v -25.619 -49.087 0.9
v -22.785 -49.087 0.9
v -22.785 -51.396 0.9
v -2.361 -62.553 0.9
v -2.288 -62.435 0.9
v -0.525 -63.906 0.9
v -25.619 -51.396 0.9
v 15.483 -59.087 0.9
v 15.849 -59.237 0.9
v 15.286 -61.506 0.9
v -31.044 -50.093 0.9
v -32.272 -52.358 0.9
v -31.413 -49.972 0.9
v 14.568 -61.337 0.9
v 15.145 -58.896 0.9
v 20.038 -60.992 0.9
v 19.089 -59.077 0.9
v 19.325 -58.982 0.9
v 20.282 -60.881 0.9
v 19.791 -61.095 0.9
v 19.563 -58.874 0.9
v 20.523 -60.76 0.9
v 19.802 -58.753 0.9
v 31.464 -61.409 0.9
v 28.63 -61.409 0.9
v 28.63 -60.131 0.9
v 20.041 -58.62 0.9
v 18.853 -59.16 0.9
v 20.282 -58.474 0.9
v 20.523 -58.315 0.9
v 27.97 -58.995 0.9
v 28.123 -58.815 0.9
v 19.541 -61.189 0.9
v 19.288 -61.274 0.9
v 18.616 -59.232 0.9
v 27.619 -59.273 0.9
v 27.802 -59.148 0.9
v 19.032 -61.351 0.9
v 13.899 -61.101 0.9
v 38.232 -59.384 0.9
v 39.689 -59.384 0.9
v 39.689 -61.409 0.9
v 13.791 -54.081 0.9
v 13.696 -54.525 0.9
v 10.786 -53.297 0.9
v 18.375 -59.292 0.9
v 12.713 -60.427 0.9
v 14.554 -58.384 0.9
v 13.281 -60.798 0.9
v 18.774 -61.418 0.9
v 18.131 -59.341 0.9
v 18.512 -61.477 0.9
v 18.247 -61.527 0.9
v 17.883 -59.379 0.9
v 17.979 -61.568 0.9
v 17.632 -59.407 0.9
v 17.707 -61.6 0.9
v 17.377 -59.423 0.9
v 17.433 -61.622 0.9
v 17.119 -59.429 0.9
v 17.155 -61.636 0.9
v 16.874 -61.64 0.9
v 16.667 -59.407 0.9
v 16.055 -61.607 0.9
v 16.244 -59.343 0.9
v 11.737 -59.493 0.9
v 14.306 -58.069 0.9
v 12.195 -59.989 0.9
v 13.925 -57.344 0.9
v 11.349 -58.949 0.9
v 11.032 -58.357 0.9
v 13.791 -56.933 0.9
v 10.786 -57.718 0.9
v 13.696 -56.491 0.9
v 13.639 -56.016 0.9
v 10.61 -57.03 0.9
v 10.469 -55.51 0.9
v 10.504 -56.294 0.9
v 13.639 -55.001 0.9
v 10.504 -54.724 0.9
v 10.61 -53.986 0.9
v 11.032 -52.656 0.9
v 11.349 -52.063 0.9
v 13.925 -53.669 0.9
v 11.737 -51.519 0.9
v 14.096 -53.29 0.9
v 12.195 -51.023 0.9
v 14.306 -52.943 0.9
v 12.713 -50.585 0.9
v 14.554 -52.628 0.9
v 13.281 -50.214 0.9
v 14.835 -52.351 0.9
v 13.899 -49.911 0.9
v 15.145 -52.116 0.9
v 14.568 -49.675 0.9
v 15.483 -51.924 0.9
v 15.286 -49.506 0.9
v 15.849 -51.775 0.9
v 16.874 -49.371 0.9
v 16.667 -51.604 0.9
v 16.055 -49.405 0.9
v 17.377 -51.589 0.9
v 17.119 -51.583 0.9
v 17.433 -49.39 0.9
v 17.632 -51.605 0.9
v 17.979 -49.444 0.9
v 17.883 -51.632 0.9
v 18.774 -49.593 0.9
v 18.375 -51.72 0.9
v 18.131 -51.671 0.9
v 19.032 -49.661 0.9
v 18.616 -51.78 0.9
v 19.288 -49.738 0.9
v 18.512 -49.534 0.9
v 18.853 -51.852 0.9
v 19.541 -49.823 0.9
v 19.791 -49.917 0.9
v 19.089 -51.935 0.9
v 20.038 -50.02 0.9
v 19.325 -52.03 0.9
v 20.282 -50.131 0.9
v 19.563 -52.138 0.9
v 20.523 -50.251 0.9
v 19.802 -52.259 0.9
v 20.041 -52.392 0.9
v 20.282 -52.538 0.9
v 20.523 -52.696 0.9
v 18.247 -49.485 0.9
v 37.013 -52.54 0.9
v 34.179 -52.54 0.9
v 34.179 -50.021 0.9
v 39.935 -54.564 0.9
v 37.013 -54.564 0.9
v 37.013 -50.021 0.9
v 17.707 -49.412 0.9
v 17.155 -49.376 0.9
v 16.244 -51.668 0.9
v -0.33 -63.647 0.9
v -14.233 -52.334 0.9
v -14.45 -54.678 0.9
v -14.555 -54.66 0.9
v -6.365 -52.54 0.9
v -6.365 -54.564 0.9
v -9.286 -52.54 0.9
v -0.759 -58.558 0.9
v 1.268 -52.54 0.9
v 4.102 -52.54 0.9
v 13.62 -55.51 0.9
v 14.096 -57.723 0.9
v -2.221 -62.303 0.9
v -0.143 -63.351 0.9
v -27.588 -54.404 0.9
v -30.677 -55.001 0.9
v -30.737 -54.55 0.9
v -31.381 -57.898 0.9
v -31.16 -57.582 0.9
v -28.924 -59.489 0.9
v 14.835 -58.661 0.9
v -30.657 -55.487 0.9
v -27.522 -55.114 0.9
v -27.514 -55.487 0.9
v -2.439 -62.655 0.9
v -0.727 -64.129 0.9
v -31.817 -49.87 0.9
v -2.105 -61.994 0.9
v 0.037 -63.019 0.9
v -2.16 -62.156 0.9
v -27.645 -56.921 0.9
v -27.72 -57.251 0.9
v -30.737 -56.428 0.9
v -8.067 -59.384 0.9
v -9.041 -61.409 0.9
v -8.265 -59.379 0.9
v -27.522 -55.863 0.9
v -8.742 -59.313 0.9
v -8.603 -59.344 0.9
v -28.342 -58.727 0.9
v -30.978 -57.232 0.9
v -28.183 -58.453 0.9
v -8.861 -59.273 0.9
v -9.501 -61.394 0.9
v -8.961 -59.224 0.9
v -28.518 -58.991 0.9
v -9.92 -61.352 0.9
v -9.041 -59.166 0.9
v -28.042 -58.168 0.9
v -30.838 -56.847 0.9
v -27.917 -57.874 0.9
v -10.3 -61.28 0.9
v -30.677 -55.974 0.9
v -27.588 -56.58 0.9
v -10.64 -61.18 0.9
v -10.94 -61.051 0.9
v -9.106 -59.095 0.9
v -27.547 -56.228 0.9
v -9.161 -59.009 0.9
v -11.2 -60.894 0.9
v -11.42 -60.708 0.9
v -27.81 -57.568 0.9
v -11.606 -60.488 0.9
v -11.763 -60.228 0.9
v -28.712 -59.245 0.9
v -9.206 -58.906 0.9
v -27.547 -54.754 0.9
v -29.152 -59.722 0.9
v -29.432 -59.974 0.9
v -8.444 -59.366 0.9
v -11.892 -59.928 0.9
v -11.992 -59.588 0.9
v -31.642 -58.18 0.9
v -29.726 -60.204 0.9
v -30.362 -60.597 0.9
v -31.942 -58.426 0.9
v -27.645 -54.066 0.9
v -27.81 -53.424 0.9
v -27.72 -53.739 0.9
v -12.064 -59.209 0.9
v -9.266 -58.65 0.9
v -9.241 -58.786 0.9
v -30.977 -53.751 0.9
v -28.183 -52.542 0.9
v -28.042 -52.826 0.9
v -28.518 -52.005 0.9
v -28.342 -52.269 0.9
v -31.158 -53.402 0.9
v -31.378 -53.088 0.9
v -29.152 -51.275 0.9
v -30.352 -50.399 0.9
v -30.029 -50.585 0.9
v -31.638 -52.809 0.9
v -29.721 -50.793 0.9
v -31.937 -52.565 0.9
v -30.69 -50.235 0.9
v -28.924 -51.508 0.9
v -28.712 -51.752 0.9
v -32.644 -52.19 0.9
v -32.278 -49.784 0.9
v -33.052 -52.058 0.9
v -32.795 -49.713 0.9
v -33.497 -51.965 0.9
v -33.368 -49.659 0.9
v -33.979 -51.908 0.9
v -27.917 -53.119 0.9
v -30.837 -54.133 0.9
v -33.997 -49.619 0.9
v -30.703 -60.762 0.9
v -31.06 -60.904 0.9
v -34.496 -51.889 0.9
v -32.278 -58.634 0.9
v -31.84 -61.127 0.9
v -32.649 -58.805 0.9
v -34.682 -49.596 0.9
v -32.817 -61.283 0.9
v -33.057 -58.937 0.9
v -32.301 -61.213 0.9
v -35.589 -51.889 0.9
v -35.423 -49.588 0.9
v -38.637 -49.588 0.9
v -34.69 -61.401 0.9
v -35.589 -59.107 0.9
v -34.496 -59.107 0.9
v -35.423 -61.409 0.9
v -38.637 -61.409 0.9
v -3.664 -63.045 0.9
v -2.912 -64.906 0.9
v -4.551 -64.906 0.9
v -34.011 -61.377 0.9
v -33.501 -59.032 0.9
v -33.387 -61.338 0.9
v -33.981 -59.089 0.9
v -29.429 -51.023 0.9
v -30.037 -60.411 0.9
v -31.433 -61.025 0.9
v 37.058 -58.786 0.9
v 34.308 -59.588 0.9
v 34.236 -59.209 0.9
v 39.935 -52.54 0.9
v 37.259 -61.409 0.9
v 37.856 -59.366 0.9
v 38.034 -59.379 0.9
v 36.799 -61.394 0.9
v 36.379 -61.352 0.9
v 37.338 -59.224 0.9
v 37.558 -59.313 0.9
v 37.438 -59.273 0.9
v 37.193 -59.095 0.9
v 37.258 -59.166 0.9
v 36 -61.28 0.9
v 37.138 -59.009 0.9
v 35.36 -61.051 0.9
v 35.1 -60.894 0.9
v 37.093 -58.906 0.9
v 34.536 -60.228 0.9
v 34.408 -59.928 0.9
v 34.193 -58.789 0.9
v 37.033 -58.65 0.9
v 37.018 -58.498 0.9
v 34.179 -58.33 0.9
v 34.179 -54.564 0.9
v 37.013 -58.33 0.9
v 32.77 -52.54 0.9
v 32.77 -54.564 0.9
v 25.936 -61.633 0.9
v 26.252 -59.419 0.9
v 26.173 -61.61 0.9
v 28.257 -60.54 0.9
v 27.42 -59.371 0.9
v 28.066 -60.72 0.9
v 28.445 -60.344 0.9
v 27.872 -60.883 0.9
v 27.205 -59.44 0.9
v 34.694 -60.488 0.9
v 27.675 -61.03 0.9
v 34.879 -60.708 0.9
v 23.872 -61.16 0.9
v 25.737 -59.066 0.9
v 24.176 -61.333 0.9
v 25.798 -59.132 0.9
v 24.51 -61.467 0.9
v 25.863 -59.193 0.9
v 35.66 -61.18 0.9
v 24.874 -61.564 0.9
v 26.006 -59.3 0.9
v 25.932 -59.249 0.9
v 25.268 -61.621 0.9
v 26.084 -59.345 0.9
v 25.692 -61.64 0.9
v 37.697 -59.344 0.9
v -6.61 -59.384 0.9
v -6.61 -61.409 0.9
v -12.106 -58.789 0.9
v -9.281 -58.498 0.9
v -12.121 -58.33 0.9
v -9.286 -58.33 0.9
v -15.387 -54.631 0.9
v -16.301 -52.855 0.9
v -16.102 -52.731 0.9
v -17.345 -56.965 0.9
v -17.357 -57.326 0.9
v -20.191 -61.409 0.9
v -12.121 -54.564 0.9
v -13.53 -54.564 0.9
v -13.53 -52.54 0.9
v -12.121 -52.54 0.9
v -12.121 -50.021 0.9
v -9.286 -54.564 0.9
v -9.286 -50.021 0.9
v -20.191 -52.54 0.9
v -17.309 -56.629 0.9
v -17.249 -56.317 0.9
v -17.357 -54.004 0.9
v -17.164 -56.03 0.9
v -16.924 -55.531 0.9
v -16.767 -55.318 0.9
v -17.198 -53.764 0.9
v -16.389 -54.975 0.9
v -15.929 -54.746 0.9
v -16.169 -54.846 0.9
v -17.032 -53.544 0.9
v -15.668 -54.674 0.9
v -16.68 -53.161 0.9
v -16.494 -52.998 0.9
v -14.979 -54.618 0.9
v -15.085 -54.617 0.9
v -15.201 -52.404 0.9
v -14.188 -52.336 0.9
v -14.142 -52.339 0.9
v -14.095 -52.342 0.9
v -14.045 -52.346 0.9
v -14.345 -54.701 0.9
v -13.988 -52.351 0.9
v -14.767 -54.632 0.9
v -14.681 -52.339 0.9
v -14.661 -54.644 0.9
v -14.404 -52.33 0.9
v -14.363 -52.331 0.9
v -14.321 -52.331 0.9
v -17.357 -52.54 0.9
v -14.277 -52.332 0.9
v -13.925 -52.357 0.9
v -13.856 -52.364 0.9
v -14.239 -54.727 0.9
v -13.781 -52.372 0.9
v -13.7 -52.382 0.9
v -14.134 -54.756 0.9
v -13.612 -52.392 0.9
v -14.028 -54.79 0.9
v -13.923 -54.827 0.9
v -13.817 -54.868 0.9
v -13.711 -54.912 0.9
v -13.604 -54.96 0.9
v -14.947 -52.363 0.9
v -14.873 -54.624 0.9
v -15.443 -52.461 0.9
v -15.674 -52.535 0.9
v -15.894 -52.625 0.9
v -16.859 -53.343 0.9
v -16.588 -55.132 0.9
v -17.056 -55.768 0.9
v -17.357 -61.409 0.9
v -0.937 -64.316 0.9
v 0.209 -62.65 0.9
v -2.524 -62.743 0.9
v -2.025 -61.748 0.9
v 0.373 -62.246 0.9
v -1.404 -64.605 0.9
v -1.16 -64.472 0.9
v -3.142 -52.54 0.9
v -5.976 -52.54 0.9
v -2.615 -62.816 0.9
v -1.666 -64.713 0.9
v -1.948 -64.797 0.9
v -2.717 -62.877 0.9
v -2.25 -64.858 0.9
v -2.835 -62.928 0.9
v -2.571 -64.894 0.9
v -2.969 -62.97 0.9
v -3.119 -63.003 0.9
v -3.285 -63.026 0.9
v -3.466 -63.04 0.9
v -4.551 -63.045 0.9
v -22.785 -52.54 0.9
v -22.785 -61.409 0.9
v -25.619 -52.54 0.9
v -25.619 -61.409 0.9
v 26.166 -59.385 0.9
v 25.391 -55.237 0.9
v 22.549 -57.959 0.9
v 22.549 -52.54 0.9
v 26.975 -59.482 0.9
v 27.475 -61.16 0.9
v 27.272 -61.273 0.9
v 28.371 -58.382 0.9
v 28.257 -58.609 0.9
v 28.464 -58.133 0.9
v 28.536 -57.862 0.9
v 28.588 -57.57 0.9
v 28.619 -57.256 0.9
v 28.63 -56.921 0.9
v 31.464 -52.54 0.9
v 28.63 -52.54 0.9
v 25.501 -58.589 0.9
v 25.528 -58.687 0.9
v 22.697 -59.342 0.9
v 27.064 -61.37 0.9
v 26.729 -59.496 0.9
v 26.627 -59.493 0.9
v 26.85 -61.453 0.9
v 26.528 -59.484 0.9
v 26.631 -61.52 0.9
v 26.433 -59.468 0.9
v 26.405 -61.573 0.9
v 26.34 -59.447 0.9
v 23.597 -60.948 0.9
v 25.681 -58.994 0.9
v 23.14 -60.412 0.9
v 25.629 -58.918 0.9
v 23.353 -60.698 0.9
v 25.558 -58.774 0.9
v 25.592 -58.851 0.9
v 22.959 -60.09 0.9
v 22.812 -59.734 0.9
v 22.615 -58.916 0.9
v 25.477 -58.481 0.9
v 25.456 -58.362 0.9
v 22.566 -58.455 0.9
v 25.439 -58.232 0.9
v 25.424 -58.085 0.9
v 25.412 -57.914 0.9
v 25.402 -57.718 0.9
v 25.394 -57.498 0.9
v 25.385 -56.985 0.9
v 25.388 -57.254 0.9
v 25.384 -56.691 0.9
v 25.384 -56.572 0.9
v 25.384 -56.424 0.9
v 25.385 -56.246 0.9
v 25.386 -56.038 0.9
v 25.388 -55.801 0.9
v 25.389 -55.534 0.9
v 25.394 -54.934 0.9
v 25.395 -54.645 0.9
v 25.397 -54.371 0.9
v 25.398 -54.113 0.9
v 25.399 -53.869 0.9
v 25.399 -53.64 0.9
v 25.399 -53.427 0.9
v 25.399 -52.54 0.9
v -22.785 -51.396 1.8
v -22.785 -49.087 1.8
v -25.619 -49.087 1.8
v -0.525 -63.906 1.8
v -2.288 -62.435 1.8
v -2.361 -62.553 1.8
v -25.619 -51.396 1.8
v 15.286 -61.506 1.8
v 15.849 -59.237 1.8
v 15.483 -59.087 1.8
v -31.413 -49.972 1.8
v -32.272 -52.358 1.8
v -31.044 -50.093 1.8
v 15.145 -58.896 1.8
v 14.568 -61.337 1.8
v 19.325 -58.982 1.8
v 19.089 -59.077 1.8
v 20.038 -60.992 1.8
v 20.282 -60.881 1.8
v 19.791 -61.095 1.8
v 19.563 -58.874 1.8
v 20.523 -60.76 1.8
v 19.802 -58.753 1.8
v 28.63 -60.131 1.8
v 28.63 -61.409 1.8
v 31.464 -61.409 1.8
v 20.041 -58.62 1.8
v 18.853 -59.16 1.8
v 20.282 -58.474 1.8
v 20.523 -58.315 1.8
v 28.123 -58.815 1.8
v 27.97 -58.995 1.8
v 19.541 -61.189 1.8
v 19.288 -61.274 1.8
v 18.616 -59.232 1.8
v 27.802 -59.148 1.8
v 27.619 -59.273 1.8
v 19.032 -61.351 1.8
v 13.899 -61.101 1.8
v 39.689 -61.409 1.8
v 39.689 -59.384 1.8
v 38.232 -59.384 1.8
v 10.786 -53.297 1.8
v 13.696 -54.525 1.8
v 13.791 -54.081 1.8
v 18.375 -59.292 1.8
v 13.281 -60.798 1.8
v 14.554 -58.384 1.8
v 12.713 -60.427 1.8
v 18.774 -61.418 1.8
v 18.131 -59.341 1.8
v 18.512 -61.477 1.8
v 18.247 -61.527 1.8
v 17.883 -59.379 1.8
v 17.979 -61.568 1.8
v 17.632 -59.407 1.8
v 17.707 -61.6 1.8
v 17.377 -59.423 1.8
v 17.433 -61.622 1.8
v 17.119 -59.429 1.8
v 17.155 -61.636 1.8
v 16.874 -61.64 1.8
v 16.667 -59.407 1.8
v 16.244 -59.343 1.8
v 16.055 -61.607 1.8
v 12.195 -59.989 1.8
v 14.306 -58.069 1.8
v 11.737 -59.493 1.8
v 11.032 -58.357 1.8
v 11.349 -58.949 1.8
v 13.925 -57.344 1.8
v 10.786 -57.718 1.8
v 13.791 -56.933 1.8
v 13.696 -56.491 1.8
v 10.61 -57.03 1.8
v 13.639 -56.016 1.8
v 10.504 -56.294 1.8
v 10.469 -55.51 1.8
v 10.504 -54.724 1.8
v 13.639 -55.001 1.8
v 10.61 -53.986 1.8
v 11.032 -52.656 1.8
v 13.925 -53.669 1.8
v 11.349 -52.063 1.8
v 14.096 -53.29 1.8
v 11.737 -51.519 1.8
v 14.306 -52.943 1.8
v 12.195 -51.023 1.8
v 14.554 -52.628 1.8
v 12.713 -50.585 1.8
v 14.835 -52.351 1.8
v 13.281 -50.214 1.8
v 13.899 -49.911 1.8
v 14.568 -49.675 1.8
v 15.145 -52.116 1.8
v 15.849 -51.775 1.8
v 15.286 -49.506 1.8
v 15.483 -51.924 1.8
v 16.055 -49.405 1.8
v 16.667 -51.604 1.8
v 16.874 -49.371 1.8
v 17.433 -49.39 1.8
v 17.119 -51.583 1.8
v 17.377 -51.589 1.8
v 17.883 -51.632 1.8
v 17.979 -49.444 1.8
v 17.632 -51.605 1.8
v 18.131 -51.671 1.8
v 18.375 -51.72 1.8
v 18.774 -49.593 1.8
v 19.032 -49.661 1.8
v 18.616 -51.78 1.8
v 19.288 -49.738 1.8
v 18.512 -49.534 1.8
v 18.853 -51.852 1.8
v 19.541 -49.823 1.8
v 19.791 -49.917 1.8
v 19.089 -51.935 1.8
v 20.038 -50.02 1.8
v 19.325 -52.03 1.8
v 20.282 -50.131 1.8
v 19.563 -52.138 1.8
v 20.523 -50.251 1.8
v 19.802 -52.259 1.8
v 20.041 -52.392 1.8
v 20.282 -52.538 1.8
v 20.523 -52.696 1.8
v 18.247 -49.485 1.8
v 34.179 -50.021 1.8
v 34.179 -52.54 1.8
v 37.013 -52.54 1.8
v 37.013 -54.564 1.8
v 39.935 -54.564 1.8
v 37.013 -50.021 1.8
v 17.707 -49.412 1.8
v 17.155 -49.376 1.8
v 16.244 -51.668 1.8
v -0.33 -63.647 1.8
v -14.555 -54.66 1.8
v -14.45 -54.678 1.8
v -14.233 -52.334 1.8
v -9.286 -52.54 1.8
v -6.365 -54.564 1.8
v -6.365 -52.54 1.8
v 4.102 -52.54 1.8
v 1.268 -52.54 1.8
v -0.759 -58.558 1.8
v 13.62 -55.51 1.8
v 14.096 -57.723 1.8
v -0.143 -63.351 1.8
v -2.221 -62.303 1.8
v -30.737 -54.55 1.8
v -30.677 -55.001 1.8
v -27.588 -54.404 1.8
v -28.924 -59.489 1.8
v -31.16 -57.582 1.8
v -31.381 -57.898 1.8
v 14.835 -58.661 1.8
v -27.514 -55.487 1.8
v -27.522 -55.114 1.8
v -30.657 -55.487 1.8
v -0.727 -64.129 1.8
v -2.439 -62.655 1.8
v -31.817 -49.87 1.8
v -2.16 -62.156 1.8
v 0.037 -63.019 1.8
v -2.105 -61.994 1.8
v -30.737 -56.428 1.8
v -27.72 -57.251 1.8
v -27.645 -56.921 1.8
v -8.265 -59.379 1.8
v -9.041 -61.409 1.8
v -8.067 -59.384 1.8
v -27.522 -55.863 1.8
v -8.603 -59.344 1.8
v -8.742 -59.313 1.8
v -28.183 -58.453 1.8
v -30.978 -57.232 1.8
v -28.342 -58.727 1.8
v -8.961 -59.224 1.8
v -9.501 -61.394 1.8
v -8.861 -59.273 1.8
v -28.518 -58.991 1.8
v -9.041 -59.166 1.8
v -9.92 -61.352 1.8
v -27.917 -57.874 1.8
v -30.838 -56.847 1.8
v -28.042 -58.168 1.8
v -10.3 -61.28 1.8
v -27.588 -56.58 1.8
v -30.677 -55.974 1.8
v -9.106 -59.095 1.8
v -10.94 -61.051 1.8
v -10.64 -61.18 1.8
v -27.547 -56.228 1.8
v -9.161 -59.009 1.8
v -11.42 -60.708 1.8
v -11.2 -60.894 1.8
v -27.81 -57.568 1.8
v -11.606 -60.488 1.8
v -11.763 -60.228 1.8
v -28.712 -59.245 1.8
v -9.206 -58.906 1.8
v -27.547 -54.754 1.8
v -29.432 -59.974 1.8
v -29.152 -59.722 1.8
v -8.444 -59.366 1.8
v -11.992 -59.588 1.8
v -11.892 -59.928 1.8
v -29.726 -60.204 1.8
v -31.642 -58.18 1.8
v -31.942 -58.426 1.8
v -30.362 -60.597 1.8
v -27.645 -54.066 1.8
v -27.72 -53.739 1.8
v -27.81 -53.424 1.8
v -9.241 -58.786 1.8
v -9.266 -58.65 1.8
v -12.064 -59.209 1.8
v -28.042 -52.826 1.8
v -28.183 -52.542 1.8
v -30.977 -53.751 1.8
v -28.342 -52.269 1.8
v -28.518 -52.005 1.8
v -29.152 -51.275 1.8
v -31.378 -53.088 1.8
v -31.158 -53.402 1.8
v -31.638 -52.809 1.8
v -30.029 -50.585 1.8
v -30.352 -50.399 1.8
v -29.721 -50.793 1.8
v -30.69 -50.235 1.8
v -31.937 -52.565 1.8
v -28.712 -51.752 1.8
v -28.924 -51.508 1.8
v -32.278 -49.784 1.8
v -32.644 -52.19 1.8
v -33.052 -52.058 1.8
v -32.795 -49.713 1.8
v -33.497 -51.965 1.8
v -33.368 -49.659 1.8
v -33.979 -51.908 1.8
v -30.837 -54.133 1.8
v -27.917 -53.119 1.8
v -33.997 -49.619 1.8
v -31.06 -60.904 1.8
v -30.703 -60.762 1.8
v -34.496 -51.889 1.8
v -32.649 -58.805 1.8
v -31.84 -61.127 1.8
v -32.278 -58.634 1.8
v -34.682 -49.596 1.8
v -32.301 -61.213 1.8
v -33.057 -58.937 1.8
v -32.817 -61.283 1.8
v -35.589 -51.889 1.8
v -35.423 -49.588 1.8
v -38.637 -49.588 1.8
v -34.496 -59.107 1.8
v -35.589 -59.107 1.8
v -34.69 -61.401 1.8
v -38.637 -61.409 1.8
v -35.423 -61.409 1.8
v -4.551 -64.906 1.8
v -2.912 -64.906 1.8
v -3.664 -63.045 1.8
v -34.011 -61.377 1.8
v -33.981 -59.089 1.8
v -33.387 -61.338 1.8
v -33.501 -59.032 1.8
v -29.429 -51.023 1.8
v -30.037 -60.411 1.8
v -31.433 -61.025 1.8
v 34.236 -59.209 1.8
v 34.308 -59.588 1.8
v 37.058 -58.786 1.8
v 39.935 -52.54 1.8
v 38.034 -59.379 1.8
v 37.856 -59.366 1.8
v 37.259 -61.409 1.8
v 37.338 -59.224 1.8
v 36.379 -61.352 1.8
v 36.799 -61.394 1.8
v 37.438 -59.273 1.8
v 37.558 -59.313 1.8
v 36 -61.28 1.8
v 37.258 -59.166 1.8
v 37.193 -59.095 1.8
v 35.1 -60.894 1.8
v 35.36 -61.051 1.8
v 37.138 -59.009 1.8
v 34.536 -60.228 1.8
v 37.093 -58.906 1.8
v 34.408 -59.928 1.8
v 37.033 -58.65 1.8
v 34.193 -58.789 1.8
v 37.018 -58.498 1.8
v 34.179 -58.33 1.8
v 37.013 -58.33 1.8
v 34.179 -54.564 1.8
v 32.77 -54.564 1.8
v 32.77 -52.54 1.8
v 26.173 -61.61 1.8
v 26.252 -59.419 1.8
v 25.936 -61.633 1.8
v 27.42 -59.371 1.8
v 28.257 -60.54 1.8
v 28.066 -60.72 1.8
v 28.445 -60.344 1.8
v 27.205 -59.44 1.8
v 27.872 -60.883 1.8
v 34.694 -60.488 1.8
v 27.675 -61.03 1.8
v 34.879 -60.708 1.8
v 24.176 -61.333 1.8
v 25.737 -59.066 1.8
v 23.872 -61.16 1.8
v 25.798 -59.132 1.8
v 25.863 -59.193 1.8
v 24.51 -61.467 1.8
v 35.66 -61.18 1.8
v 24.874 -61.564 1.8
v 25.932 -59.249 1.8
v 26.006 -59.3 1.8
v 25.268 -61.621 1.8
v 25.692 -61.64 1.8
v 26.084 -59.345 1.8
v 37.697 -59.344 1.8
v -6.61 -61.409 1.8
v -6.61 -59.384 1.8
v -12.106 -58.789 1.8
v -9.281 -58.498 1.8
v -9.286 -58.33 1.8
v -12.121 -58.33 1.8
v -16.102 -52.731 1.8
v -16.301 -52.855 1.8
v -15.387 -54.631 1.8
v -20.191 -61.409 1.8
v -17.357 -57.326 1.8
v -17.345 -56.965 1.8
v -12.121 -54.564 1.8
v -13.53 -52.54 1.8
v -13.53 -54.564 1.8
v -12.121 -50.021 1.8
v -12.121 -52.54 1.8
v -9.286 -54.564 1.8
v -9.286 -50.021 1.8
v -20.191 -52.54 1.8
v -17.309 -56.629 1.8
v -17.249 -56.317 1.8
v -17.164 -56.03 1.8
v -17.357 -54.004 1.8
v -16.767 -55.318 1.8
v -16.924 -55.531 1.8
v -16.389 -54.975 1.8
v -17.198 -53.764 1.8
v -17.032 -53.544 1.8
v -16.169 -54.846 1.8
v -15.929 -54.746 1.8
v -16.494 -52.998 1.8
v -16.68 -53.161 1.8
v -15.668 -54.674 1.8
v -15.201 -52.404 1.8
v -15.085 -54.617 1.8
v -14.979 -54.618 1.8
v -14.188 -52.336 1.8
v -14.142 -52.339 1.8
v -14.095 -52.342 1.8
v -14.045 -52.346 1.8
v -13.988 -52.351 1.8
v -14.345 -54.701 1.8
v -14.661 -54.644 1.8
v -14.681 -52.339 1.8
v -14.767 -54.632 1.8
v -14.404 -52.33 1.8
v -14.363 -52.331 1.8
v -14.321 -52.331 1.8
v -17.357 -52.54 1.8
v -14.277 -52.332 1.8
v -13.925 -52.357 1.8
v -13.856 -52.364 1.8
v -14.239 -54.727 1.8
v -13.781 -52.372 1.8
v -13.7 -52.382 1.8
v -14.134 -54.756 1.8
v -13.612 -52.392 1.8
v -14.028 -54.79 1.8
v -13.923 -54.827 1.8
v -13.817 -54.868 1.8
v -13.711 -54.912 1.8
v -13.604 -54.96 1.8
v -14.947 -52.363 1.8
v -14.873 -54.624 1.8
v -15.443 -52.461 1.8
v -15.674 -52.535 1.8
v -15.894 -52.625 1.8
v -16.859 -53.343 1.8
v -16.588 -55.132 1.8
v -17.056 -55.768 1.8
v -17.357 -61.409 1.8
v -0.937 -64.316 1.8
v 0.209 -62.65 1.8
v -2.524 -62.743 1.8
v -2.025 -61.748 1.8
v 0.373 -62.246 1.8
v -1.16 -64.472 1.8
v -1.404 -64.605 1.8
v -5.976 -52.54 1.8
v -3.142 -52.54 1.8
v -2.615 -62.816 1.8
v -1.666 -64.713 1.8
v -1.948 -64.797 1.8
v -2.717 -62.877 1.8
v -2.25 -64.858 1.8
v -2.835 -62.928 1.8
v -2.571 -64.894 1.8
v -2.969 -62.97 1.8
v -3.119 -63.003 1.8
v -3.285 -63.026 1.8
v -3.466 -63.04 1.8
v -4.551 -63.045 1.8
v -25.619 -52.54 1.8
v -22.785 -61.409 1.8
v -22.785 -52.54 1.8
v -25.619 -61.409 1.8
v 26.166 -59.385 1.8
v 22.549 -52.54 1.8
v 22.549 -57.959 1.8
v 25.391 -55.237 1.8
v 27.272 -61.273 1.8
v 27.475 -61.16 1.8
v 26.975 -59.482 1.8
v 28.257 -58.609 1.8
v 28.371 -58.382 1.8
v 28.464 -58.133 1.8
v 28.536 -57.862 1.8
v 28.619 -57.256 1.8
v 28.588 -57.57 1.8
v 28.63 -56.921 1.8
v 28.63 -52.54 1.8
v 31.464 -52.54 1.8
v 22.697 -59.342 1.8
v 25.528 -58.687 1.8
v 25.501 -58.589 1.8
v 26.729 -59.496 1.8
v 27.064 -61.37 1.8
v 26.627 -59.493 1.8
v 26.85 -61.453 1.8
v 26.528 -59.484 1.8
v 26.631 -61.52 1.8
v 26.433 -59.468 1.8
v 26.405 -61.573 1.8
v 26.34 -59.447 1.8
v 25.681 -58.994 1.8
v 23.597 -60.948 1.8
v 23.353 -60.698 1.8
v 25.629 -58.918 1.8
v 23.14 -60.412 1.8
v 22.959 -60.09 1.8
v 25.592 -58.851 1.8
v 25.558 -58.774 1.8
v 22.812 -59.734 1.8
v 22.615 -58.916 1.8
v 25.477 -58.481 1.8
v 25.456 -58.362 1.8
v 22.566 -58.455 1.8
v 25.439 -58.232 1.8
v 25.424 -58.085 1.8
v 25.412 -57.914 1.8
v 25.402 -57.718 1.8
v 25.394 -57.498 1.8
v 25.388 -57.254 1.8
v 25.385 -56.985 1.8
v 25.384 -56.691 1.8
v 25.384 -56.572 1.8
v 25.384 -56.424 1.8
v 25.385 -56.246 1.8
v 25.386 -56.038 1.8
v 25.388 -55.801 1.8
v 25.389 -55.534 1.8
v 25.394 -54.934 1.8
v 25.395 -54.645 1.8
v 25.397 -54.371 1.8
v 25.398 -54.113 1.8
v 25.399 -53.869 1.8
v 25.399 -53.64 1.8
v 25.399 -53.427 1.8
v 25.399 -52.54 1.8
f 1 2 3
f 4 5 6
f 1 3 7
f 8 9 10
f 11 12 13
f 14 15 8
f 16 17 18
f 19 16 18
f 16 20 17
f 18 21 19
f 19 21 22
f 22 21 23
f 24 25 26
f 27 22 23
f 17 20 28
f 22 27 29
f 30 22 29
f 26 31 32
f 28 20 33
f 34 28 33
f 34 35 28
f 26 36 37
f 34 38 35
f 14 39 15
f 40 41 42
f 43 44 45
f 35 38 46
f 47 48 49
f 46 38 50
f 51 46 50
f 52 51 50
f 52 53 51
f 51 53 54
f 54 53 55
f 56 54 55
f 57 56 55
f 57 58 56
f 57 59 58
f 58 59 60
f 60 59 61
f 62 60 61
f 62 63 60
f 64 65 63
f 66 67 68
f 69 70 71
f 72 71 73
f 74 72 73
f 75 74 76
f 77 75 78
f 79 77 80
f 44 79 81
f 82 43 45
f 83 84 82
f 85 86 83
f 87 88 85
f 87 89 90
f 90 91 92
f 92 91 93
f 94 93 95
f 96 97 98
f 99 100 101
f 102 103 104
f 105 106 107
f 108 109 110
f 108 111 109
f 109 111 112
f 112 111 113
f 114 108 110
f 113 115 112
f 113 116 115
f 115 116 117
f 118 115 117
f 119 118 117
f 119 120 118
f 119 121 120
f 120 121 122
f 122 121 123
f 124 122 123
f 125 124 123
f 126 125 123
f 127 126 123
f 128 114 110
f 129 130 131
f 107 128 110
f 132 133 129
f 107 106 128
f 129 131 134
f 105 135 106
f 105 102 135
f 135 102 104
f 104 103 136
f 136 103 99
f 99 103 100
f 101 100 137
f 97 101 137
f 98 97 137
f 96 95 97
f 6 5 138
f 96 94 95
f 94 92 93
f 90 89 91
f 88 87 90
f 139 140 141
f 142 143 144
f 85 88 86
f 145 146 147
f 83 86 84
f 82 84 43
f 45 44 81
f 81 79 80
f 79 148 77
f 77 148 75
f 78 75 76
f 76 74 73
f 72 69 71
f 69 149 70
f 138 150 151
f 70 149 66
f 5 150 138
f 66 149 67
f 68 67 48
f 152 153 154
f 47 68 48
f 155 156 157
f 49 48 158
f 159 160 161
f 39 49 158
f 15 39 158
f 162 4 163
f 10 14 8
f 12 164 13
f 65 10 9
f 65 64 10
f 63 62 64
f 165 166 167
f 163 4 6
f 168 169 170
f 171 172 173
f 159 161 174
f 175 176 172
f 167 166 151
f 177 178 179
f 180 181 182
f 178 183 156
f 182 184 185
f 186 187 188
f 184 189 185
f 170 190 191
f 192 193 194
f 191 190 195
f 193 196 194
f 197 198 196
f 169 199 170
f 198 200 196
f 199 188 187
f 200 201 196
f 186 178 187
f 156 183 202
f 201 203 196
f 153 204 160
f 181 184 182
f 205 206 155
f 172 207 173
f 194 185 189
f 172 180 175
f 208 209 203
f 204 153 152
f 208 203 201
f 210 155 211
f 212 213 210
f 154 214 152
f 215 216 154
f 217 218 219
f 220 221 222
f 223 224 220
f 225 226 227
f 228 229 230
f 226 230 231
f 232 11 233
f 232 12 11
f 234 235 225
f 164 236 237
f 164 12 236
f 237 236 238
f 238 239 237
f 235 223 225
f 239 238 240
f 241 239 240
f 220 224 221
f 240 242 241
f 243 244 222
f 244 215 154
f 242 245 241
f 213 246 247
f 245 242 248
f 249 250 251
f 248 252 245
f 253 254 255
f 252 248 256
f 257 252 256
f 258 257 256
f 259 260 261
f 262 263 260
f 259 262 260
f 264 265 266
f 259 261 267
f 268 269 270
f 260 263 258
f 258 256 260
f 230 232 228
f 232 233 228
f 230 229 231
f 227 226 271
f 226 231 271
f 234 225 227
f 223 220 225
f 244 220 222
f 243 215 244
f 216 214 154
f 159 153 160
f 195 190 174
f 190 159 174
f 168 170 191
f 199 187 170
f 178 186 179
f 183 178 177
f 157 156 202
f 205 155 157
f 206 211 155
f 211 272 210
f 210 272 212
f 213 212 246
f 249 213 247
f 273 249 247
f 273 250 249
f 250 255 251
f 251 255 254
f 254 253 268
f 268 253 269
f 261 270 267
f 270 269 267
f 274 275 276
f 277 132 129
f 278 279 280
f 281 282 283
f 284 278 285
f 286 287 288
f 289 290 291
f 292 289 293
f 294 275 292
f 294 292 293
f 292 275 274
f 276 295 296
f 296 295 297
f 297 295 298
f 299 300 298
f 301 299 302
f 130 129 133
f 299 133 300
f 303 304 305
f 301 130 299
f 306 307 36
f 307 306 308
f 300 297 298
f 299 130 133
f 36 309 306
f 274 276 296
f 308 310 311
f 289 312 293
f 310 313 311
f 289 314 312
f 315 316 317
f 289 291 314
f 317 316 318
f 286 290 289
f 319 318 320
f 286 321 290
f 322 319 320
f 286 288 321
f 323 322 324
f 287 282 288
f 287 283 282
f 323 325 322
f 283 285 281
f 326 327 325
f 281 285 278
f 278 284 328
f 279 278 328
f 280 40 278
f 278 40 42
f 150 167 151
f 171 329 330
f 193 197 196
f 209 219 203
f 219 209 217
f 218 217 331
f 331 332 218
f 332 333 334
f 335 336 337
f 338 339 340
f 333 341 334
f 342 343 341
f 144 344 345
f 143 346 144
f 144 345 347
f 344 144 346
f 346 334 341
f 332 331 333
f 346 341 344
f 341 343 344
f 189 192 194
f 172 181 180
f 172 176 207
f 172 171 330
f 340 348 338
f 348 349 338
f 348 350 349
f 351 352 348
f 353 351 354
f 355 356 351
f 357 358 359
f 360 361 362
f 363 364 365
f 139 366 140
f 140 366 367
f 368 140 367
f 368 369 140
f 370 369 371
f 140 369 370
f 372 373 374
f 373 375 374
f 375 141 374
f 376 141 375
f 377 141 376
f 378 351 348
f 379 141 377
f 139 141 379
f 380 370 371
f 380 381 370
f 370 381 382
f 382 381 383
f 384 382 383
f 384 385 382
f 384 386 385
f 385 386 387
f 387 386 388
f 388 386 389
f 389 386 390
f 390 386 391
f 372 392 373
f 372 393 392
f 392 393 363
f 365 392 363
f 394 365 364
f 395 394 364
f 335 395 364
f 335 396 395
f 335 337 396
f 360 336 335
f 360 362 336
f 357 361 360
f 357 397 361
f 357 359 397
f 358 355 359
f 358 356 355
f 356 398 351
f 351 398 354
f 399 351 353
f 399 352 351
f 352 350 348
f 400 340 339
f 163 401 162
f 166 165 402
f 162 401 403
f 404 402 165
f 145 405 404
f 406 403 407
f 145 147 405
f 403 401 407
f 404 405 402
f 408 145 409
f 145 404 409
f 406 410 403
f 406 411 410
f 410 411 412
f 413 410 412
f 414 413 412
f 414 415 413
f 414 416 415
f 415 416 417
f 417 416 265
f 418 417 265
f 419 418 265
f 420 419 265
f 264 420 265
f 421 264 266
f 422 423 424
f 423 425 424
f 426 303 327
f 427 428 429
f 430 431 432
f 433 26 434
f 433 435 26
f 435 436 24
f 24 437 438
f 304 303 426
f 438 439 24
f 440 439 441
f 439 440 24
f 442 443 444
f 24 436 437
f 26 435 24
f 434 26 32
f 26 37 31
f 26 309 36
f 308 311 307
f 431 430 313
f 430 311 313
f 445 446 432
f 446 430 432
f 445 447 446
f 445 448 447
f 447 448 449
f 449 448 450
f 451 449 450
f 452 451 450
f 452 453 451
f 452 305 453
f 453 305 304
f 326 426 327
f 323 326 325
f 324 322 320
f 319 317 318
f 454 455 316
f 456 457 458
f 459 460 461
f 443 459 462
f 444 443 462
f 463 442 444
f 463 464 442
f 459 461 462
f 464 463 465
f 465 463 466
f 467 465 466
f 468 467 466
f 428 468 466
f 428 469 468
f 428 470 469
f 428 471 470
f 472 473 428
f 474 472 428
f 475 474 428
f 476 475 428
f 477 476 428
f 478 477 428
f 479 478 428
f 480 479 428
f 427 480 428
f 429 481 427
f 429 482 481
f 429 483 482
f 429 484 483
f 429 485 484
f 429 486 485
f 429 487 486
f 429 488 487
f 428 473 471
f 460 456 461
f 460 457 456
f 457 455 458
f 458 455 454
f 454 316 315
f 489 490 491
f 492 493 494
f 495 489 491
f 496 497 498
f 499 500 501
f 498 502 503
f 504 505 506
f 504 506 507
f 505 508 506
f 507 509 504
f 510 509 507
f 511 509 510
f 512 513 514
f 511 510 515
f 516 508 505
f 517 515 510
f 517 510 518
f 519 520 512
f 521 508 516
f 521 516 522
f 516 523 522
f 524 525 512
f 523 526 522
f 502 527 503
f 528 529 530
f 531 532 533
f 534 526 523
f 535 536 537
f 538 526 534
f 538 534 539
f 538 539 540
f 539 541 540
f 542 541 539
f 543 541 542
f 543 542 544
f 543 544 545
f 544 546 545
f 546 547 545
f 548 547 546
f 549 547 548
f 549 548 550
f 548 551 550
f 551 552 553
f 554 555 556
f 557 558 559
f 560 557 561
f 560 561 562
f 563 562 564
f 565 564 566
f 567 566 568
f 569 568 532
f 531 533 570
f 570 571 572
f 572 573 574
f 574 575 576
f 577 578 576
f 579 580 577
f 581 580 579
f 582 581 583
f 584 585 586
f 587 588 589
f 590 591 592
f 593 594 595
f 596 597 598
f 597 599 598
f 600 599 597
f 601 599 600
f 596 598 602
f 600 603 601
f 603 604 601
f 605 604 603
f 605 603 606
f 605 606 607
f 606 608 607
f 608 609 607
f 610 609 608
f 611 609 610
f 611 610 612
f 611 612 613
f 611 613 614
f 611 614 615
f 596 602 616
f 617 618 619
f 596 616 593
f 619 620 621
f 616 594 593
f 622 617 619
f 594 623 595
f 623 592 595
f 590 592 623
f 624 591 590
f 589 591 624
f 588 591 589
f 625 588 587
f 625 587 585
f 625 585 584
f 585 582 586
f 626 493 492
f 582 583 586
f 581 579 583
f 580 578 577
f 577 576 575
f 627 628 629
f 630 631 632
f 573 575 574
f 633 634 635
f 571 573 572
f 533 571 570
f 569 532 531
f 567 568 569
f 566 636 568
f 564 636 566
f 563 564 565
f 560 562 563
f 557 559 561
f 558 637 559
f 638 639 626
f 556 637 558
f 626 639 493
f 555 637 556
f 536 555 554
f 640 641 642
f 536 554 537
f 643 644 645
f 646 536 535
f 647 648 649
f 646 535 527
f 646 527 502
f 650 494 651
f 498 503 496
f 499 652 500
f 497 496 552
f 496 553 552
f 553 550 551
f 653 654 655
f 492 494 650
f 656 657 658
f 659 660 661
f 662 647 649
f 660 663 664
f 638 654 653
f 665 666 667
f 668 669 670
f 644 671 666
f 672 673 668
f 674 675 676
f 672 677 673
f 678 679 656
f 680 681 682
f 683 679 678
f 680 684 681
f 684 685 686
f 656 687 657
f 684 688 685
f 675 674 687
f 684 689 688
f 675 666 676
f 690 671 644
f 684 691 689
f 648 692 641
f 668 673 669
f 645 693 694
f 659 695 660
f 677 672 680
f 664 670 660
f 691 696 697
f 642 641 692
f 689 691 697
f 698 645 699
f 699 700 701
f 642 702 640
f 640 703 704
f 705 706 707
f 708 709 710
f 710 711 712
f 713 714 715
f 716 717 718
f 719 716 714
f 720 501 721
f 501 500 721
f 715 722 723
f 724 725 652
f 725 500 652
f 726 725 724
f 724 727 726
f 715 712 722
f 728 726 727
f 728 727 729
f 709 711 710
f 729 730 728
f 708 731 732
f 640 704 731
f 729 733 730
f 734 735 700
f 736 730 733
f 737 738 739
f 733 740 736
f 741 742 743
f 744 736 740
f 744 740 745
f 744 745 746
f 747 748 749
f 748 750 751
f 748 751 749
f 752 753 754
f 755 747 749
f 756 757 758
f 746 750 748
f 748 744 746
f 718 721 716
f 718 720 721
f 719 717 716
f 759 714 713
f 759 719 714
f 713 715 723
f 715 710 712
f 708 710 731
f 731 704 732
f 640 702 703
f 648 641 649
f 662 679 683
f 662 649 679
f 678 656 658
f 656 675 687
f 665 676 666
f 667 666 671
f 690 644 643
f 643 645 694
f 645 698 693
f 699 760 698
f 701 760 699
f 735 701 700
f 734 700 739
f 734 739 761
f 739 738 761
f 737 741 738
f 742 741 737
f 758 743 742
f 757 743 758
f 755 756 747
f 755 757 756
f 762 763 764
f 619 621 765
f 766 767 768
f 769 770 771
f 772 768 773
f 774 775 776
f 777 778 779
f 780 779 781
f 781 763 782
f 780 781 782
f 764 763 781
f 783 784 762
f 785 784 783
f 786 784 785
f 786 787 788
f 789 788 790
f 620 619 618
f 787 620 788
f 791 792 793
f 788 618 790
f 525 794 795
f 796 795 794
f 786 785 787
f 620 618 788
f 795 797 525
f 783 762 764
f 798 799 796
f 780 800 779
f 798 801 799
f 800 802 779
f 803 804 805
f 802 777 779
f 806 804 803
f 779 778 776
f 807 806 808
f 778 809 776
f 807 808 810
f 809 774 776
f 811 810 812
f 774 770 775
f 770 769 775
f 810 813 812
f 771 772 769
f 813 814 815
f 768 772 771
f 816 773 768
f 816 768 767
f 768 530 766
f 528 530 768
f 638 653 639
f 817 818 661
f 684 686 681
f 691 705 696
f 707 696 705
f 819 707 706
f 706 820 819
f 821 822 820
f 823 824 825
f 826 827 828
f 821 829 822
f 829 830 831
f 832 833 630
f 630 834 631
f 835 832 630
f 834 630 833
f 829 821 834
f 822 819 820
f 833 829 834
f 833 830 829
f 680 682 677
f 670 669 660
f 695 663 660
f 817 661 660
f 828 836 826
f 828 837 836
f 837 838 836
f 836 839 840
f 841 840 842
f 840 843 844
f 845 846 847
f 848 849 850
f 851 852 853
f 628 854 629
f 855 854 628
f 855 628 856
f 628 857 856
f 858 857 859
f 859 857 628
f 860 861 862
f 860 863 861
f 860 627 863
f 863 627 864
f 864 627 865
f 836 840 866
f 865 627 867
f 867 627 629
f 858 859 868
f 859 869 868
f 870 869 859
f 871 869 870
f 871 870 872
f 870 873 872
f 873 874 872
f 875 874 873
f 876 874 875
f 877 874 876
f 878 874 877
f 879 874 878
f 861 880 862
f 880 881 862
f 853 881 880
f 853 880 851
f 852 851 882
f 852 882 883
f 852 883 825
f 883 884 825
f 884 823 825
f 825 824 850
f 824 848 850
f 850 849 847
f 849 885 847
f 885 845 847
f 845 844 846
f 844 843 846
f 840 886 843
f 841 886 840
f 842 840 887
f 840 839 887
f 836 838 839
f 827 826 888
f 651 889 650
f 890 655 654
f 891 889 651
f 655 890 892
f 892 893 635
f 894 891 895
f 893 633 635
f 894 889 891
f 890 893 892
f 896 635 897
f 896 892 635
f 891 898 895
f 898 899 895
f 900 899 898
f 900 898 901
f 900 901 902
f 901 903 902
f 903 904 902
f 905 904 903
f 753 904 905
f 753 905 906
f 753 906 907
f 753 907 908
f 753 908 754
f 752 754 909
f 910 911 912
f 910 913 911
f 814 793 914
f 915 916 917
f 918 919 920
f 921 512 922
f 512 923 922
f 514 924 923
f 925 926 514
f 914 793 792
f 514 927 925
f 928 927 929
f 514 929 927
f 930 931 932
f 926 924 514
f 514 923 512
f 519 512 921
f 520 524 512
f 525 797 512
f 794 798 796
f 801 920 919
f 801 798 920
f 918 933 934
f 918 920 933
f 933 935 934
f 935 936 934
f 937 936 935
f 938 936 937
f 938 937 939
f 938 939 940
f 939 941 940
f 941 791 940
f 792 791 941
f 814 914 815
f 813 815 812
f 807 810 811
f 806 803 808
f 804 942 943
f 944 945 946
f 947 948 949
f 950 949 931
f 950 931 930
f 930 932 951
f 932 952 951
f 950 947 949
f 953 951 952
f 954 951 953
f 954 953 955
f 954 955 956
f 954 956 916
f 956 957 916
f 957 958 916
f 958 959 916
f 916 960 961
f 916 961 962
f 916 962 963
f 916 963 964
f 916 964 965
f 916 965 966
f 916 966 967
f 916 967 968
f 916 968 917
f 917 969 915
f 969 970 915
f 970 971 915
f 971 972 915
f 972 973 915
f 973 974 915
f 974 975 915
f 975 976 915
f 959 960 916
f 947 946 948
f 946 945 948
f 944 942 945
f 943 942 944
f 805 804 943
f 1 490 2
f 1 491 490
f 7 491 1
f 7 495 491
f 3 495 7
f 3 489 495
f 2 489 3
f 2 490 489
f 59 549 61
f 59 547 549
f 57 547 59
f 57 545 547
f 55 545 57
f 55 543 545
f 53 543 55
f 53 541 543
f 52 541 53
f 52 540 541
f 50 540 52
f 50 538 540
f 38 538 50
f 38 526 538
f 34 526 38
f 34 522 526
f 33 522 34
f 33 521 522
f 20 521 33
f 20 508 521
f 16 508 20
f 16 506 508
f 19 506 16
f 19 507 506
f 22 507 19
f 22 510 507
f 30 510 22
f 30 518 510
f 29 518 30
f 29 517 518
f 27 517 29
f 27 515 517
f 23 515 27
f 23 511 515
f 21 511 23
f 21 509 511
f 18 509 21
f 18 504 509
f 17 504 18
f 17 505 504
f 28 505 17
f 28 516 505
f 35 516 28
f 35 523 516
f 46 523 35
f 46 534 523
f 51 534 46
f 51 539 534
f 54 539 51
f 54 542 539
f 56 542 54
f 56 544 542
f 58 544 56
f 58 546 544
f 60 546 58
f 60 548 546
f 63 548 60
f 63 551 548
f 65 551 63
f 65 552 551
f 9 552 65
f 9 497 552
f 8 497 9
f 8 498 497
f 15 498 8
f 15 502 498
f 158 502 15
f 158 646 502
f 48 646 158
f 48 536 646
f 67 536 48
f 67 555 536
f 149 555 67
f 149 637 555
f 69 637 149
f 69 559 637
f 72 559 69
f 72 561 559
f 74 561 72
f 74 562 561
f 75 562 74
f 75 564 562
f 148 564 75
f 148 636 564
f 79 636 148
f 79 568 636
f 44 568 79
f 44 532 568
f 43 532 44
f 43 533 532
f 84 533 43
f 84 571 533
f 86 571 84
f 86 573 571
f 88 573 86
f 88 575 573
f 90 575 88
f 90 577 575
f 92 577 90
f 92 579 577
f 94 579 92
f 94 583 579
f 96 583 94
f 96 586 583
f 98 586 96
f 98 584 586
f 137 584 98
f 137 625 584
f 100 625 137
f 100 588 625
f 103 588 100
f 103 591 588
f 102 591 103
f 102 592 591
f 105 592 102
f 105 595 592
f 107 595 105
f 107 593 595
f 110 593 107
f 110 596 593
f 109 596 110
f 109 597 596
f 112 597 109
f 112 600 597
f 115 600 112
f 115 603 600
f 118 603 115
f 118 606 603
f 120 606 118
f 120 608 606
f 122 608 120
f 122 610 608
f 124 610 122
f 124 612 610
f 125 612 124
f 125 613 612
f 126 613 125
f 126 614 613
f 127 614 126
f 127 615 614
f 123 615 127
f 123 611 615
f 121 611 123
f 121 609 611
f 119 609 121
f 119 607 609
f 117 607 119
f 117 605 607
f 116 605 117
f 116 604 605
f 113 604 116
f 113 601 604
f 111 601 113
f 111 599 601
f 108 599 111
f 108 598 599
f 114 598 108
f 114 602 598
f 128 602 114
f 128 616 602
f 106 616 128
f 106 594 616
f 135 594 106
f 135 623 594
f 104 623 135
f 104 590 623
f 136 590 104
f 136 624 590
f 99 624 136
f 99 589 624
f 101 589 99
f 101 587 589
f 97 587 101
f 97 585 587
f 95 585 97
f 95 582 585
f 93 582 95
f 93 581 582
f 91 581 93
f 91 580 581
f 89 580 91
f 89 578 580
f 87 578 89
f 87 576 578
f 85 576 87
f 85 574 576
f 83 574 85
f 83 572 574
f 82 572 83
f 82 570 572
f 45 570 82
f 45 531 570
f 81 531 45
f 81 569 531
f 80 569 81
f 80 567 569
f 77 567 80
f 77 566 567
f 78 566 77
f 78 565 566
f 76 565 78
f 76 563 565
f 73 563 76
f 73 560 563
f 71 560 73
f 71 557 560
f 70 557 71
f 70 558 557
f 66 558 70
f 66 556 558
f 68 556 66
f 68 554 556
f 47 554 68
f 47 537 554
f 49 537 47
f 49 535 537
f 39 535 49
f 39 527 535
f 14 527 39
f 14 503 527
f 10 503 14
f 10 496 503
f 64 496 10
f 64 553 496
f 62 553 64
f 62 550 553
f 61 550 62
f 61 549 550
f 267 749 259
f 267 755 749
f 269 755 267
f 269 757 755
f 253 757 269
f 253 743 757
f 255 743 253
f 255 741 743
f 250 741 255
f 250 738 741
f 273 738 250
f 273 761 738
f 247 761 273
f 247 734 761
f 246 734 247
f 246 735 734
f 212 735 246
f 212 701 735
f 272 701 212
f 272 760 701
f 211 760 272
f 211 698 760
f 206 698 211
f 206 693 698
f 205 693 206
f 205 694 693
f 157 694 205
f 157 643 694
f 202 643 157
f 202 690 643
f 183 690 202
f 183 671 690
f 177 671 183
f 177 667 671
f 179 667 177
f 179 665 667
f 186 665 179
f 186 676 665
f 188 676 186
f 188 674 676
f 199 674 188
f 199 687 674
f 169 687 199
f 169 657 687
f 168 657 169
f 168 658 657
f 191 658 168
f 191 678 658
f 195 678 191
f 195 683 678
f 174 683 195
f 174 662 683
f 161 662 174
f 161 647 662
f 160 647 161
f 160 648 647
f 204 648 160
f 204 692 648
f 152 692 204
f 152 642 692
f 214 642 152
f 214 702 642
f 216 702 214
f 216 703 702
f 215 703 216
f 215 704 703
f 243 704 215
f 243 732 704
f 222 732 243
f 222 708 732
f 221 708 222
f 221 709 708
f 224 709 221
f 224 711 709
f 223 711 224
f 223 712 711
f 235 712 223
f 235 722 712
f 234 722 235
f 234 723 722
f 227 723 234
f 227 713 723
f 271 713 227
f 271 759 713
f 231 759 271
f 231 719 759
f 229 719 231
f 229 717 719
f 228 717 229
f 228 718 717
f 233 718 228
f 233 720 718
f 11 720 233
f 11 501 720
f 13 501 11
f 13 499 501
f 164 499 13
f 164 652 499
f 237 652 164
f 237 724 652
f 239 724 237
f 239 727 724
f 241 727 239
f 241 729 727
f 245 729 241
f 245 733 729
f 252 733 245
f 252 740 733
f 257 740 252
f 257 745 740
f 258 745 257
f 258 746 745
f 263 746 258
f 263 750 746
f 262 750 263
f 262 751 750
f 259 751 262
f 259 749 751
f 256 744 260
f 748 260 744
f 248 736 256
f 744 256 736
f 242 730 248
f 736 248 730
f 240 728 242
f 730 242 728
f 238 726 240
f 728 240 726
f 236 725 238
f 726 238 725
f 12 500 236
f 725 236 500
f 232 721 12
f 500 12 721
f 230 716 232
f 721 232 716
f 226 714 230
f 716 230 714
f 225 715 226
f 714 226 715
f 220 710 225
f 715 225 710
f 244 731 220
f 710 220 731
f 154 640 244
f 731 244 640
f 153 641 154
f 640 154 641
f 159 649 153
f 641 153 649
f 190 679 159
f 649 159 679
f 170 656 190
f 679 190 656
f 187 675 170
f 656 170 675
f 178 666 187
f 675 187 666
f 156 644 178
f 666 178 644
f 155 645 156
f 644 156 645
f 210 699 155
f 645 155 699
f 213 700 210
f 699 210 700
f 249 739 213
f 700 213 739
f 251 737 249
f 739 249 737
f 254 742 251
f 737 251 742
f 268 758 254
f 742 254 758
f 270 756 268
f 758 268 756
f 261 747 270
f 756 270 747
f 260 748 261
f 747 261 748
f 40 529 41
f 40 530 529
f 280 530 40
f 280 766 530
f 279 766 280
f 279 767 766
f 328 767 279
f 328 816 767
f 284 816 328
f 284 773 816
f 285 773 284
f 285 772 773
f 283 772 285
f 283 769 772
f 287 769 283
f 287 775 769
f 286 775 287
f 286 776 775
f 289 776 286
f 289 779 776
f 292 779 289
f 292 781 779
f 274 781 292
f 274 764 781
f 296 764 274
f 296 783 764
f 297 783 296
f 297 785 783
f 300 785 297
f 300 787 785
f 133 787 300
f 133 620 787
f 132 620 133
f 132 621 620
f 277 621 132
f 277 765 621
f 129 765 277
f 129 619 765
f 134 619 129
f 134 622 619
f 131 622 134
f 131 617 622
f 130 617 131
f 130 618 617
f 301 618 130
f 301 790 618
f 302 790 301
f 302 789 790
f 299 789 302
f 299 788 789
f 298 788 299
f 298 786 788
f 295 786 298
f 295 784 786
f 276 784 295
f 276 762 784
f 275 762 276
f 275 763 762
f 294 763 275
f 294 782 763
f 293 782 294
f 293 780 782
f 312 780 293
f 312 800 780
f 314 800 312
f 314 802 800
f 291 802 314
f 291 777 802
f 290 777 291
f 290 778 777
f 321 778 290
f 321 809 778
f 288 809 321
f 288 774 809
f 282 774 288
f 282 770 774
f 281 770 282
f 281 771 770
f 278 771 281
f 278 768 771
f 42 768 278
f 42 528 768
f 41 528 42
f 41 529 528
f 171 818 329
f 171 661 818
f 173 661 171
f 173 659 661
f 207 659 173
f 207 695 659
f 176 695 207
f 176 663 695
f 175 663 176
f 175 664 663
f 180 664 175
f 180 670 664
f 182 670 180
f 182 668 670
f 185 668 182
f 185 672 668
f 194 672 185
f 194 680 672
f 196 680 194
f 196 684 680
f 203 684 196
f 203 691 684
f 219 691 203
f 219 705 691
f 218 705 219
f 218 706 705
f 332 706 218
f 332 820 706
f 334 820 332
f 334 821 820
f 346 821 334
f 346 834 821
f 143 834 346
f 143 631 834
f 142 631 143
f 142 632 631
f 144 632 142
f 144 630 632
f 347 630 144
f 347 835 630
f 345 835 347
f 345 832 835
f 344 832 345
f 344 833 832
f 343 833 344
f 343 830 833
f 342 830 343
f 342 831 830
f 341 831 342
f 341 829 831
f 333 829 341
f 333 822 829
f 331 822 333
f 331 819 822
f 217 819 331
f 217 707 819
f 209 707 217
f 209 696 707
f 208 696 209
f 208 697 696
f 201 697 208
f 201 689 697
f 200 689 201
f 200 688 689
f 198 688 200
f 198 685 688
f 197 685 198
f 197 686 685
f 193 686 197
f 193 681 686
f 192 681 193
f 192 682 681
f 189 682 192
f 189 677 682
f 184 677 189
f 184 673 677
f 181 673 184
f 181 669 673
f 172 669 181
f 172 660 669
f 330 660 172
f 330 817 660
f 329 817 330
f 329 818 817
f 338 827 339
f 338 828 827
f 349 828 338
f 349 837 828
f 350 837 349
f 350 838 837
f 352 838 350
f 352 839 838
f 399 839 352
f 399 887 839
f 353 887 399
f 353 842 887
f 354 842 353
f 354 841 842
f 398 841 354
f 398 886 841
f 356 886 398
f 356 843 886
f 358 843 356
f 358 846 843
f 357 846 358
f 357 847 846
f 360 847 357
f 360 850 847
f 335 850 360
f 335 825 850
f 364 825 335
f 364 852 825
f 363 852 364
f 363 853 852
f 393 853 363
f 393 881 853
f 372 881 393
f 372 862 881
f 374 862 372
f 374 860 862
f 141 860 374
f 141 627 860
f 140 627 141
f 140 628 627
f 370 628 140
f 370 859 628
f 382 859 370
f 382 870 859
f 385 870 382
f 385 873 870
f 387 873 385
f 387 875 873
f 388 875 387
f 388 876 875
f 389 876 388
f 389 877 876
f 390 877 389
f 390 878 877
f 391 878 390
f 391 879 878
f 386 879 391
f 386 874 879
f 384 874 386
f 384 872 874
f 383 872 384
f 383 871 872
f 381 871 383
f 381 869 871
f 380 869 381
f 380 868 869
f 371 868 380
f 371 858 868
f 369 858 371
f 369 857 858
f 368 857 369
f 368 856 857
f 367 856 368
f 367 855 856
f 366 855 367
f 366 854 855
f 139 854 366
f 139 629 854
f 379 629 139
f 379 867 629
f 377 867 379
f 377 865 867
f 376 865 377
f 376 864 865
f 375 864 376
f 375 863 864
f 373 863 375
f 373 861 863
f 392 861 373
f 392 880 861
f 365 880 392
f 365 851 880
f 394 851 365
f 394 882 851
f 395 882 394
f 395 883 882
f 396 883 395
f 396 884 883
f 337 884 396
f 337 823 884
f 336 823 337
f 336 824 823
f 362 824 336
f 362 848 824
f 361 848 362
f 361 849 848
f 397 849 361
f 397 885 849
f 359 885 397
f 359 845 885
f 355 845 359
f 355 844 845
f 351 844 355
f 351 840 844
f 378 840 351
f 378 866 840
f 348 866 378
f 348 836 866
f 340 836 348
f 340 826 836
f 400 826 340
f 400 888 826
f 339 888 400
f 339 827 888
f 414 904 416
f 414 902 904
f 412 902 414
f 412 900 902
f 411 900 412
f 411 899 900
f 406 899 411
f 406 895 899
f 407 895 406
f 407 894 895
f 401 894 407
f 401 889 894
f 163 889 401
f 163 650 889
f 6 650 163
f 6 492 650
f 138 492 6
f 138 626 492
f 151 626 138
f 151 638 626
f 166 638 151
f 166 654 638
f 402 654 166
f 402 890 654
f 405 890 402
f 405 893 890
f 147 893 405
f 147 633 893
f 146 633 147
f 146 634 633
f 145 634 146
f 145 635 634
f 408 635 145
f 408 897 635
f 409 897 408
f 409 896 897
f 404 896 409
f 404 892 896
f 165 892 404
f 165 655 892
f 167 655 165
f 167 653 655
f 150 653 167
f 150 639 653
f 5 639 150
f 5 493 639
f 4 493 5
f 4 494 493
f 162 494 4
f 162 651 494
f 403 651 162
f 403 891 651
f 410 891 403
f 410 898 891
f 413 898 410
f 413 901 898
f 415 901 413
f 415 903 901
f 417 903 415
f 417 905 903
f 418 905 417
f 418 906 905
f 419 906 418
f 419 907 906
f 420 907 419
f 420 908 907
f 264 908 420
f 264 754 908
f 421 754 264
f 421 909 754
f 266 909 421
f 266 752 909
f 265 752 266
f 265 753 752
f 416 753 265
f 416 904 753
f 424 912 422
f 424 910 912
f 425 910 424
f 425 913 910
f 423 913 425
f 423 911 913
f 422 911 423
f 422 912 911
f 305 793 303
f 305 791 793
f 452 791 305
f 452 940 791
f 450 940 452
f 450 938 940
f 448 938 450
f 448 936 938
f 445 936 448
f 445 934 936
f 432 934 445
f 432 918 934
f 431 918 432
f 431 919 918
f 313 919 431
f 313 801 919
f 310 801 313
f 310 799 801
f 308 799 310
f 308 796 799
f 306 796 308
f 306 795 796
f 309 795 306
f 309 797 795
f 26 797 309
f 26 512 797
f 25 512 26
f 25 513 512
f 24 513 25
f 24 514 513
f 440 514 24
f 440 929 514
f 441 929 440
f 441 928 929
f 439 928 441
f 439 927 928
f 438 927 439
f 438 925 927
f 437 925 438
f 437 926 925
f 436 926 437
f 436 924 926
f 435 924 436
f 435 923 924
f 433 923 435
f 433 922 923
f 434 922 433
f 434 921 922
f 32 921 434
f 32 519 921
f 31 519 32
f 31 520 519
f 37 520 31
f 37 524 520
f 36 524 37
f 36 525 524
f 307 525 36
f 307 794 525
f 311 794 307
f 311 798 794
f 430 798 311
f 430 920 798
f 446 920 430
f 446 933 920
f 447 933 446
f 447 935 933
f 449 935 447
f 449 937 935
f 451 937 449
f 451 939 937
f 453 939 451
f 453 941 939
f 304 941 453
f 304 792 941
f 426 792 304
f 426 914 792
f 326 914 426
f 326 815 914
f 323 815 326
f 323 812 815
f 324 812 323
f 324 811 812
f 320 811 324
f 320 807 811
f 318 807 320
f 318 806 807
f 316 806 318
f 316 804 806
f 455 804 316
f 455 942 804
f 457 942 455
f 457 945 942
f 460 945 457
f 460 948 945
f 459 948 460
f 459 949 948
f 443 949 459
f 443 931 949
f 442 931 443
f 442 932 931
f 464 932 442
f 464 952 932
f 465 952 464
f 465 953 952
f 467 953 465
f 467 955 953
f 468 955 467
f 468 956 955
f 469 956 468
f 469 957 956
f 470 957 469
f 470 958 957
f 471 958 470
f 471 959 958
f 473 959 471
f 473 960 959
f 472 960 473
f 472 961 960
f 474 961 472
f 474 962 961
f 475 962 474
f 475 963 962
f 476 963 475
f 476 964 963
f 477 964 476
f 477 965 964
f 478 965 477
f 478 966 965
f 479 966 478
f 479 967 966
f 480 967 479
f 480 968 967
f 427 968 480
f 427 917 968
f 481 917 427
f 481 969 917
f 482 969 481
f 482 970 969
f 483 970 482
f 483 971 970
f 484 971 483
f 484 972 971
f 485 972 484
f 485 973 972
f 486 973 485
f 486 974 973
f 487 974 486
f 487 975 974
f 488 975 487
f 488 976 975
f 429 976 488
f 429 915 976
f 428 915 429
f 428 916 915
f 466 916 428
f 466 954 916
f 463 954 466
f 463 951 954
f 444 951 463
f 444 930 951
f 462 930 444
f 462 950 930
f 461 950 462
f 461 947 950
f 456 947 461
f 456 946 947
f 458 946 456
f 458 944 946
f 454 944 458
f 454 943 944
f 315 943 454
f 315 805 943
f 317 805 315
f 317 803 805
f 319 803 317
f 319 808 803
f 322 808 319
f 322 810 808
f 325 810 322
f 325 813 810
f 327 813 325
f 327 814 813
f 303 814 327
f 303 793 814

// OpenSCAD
$fn = 48;
  // English (below bottom hole)
  translate([0, -57.100, 0.900]) linear_extrude(height=0.900) text("Dirty Cut", size=11.675, halign="center", valign="center", font="Helvetica Neue:style=Bold");
